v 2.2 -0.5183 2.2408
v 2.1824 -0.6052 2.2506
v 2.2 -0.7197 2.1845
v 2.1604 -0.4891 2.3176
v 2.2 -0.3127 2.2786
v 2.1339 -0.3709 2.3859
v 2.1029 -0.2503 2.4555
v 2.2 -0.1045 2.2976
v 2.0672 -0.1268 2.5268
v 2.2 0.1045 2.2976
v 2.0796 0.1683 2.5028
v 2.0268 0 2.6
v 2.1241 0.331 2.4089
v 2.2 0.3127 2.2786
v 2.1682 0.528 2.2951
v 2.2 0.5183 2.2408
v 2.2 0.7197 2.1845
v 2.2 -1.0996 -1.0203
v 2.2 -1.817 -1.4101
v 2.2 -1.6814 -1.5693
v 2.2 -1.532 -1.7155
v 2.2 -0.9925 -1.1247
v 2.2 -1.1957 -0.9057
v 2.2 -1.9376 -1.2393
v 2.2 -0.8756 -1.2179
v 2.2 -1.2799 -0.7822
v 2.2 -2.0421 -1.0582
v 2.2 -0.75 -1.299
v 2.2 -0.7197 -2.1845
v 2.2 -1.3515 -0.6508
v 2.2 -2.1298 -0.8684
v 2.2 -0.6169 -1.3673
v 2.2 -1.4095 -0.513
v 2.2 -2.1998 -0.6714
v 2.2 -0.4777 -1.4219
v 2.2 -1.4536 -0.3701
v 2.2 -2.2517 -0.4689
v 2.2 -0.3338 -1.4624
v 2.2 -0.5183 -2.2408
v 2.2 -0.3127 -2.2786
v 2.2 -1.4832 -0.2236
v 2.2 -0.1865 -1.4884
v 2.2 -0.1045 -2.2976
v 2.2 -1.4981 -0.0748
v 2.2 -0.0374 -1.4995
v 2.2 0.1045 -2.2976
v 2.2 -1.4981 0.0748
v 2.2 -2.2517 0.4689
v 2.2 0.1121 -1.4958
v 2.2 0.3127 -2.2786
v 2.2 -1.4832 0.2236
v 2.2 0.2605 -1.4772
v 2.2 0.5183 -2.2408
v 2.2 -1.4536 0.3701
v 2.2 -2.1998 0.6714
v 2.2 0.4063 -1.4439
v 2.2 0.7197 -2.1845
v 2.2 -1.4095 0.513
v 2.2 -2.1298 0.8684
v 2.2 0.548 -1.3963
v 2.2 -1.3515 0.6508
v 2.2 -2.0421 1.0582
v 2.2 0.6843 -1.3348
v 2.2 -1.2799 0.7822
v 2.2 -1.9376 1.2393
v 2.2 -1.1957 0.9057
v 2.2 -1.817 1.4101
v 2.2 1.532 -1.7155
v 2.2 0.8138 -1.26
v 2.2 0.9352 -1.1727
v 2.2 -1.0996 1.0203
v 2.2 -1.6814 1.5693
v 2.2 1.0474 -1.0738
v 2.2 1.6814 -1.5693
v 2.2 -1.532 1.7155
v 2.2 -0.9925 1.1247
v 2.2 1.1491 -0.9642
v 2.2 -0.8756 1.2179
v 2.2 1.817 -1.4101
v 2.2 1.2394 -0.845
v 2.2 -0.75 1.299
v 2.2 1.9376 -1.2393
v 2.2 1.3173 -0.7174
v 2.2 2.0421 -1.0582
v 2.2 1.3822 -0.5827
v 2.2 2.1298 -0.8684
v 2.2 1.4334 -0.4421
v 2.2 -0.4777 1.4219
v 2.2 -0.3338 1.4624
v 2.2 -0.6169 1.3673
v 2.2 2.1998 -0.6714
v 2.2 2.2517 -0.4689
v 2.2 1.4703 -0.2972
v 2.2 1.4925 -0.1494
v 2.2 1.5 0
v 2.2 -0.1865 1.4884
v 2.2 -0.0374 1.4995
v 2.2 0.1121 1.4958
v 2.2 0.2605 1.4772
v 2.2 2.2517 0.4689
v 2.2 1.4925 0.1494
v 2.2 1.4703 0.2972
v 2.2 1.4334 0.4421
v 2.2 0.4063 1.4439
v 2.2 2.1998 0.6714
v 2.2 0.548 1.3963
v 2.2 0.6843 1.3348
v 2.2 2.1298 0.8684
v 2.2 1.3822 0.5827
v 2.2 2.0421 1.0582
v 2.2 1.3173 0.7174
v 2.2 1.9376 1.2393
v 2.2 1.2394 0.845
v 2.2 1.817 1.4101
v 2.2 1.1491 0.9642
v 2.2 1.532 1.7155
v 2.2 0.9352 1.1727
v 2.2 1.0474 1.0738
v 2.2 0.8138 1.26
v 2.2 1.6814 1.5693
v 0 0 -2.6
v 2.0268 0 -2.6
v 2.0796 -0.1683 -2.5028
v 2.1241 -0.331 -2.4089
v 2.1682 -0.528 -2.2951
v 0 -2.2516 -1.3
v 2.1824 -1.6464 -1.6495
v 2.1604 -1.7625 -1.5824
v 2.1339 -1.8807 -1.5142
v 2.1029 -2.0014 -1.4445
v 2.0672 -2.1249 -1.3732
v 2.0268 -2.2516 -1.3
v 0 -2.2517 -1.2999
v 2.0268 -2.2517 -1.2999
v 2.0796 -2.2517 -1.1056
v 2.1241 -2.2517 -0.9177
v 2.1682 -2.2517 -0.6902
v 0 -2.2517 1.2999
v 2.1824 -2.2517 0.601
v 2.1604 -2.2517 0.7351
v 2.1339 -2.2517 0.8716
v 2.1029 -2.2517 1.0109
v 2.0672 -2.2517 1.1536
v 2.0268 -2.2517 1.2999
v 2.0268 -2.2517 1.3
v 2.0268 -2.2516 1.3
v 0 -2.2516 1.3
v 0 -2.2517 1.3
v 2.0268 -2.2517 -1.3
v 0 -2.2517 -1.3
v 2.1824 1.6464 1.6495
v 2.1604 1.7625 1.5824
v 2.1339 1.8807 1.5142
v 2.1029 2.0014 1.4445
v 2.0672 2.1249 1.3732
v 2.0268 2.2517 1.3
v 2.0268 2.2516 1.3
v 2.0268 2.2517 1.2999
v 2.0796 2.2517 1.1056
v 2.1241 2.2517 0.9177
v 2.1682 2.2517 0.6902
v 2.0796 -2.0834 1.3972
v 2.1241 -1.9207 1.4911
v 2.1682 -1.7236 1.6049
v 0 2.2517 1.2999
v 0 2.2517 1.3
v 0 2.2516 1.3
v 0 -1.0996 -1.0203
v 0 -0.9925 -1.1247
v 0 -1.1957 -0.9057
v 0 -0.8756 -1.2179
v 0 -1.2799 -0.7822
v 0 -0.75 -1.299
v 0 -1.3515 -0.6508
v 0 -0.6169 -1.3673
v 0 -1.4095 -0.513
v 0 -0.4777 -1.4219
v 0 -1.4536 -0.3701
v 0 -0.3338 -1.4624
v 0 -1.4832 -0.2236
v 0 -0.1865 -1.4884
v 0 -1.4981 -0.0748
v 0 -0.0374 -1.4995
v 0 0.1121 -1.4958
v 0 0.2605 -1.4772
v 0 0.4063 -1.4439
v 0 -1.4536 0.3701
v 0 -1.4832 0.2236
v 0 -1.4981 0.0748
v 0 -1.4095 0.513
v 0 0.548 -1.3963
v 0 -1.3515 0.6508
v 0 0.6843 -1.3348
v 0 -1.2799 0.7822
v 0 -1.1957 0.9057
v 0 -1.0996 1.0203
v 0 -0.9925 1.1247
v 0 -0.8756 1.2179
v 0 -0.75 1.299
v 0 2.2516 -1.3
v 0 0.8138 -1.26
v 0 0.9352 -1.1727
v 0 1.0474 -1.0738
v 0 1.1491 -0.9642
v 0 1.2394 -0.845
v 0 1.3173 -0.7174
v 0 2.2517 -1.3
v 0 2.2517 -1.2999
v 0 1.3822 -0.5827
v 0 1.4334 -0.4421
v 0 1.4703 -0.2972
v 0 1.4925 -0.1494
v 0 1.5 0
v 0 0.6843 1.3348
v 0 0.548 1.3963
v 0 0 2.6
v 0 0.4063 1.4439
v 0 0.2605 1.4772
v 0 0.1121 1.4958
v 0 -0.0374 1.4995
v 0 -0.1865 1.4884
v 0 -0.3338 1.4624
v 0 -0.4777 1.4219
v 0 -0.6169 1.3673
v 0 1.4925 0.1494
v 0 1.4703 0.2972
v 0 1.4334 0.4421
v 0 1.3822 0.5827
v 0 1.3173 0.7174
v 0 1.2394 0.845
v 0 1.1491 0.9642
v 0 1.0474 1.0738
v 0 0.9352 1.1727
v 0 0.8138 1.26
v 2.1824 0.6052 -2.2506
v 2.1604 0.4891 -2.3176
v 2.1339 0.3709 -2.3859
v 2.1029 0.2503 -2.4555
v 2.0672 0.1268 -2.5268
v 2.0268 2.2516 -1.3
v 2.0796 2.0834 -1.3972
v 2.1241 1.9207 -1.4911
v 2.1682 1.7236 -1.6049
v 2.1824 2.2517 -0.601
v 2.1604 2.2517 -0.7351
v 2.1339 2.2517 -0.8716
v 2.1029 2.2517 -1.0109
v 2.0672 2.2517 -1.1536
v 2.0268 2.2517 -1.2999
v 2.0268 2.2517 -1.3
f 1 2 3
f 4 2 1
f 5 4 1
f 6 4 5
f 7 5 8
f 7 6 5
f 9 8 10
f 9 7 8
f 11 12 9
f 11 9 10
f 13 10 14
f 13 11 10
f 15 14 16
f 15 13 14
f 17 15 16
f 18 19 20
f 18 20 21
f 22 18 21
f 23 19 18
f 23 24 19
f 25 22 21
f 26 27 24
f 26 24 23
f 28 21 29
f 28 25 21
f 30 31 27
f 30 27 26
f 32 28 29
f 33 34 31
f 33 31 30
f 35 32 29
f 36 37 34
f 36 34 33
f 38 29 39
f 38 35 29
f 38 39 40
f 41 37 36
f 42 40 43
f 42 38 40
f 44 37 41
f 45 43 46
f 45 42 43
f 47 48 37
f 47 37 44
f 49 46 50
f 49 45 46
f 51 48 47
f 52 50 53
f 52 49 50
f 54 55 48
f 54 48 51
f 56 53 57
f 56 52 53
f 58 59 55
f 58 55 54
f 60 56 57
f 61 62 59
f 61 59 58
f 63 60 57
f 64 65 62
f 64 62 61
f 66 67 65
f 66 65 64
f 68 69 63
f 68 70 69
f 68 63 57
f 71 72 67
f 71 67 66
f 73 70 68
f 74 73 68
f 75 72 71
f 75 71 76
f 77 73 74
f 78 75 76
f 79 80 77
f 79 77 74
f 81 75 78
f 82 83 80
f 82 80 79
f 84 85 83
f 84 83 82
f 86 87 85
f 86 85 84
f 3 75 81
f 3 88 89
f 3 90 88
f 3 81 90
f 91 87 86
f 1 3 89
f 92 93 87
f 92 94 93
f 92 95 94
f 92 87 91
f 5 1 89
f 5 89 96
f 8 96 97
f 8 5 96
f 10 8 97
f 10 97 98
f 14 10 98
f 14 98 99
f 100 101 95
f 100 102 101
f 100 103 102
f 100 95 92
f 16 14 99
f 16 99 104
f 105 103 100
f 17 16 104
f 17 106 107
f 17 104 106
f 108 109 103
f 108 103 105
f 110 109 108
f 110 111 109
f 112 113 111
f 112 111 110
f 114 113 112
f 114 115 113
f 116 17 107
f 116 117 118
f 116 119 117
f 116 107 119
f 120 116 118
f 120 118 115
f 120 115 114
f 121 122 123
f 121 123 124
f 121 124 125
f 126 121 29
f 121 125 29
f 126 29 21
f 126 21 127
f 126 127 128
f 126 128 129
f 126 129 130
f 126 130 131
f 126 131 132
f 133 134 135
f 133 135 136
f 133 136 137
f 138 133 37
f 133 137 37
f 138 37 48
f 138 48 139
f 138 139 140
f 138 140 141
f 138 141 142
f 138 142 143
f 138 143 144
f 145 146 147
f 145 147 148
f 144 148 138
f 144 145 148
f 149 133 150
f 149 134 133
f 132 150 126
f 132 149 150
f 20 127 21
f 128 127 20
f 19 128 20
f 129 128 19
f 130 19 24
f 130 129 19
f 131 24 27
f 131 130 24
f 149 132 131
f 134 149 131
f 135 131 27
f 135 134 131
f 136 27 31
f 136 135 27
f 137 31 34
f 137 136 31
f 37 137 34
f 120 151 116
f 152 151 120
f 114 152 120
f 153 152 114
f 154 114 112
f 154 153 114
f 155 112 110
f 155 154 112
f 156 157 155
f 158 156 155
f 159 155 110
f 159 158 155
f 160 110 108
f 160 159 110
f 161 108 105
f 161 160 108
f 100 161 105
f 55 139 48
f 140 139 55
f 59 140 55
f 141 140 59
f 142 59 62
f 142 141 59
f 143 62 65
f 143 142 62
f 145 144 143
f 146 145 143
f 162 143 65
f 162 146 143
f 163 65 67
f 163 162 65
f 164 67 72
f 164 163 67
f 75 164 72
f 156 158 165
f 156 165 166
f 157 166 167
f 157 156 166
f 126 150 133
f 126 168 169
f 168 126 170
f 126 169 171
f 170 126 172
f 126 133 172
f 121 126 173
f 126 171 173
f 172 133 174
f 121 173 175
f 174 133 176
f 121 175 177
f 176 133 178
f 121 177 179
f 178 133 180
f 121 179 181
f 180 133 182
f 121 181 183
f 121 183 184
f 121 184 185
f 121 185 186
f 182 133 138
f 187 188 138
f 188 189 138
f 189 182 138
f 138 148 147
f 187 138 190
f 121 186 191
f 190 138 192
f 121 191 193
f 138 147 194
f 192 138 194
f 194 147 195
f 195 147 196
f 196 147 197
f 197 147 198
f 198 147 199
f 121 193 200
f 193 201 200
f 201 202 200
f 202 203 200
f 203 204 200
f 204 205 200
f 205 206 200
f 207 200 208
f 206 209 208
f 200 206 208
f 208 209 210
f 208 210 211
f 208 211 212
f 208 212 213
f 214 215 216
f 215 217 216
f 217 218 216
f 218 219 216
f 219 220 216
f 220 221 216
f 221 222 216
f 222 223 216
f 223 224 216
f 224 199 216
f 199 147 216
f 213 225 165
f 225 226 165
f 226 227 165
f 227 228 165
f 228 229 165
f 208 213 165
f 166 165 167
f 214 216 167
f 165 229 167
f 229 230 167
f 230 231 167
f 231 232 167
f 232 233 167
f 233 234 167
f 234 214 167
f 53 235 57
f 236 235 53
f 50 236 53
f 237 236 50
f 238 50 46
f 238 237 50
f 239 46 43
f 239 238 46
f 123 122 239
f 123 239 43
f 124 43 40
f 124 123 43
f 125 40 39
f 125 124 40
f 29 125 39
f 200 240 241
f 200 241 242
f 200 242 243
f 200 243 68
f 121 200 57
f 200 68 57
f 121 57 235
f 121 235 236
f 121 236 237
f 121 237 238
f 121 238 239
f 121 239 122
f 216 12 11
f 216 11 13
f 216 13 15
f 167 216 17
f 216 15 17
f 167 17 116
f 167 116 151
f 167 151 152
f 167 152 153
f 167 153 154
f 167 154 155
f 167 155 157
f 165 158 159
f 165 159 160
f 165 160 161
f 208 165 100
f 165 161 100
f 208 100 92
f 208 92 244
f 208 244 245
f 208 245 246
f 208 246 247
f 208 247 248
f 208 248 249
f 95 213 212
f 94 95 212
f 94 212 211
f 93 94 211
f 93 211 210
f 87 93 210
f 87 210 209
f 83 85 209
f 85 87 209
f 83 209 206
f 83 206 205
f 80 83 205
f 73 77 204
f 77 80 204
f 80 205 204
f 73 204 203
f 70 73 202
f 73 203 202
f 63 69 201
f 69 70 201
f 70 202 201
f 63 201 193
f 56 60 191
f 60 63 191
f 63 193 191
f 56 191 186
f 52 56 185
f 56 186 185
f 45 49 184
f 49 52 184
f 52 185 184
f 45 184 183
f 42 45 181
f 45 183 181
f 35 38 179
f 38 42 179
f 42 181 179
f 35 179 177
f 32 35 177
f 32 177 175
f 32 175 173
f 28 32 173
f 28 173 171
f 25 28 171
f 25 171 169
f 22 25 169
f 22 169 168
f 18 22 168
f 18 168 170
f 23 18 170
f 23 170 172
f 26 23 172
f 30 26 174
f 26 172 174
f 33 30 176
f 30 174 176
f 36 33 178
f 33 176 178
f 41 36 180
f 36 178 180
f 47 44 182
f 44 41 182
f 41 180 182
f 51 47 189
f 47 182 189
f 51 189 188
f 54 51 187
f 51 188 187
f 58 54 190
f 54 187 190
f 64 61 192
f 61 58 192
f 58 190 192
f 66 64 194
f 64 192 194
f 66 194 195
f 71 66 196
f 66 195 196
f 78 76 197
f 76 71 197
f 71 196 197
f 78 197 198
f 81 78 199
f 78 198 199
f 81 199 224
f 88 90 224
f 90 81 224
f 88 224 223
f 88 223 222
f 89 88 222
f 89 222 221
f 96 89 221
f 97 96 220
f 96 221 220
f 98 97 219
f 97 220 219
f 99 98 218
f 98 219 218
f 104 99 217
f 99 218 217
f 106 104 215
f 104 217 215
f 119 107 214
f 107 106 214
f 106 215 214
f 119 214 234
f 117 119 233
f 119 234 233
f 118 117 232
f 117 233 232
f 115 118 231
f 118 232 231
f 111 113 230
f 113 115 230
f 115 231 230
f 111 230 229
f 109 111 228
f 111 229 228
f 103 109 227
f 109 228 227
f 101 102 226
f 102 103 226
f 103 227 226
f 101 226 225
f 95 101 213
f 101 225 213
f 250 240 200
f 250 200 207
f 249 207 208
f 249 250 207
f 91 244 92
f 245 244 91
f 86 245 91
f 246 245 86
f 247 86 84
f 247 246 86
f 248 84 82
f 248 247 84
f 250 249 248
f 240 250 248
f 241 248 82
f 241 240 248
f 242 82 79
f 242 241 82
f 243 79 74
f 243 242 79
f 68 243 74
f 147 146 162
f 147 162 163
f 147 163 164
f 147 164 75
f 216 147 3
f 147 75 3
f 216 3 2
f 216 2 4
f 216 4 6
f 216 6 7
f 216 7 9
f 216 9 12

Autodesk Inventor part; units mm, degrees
ref_plane "YZ Plane" through (0, 0, 0) normal (1, 0, 0) x (0, 1, 0)
ref_plane "XZ Plane" through (0, 0, 0) normal (0, 1, 0) x (-1, 0, 0)
ref_plane "XY Plane" through (0, 0, 0) normal (0, 0, 1) x (1, 0, 0)
sketch "Sketch17" plane through (0, 0, 0) normal (0, 0, 1) x (1, 0, 0)
  line L0 (0, 0) -> (0, 2.6) construction
  line L1 (0, 2.6) -> (2.2, 2.6)
  line L2 (2.2, 2.6) -> (2.2, 1.5)
  line L3 (2.2, 1.5) -> (0, 1.5)
  line L4 (0, 0) -> (5.189, 0) construction
  line L5 (0, 1.5) -> (0, 2.6)
  dimension "d96" = 1.5
  dimension "d98" = 2.6
  dimension "d99" = 0
  dimension "d100" = 2.2
revolve "Revolution3" add sketch "Sketch17" angle 360 about axis through (0, 0, 0) along (1, 0, 0)
chamfer "Chamfer2" distance 0.3 angle 30 1 edges at (2.2, -2.6, 0) measured on face at (2.2, 2.2081, -0.2074)
sketch "Sketch18" plane through (2.2, 0, 0) normal (1, 0, 0) x (0, 0, -1)
  circle A0 centre (0, 0) radius 2.3 construction
  line L0 (1.3, 2.2517) -> (2.6, 0)
  line L1 (2.6, 0) -> (1.3, -2.2517)
  line L2 (1.3, -2.2517) -> (-1.3, -2.2517)
  line L3 (-1.3, -2.2517) -> (-2.6, 0)
  line L4 (-2.6, 0) -> (-1.3, 2.2517)
  line L5 (-1.3, 2.2517) -> (1.3, 2.2517)
  circle A1 centre (0, 0) radius 5.5787
  dimension "d106" = 2.6
extrude "Extrusion15" cut sketch "Sketch18" along normal through all both and the other way through all
thread "Thread2" size "M2x0.4" class "6H" standard "ANSI Metric M Profile" full length
properties part number "Nut3"
